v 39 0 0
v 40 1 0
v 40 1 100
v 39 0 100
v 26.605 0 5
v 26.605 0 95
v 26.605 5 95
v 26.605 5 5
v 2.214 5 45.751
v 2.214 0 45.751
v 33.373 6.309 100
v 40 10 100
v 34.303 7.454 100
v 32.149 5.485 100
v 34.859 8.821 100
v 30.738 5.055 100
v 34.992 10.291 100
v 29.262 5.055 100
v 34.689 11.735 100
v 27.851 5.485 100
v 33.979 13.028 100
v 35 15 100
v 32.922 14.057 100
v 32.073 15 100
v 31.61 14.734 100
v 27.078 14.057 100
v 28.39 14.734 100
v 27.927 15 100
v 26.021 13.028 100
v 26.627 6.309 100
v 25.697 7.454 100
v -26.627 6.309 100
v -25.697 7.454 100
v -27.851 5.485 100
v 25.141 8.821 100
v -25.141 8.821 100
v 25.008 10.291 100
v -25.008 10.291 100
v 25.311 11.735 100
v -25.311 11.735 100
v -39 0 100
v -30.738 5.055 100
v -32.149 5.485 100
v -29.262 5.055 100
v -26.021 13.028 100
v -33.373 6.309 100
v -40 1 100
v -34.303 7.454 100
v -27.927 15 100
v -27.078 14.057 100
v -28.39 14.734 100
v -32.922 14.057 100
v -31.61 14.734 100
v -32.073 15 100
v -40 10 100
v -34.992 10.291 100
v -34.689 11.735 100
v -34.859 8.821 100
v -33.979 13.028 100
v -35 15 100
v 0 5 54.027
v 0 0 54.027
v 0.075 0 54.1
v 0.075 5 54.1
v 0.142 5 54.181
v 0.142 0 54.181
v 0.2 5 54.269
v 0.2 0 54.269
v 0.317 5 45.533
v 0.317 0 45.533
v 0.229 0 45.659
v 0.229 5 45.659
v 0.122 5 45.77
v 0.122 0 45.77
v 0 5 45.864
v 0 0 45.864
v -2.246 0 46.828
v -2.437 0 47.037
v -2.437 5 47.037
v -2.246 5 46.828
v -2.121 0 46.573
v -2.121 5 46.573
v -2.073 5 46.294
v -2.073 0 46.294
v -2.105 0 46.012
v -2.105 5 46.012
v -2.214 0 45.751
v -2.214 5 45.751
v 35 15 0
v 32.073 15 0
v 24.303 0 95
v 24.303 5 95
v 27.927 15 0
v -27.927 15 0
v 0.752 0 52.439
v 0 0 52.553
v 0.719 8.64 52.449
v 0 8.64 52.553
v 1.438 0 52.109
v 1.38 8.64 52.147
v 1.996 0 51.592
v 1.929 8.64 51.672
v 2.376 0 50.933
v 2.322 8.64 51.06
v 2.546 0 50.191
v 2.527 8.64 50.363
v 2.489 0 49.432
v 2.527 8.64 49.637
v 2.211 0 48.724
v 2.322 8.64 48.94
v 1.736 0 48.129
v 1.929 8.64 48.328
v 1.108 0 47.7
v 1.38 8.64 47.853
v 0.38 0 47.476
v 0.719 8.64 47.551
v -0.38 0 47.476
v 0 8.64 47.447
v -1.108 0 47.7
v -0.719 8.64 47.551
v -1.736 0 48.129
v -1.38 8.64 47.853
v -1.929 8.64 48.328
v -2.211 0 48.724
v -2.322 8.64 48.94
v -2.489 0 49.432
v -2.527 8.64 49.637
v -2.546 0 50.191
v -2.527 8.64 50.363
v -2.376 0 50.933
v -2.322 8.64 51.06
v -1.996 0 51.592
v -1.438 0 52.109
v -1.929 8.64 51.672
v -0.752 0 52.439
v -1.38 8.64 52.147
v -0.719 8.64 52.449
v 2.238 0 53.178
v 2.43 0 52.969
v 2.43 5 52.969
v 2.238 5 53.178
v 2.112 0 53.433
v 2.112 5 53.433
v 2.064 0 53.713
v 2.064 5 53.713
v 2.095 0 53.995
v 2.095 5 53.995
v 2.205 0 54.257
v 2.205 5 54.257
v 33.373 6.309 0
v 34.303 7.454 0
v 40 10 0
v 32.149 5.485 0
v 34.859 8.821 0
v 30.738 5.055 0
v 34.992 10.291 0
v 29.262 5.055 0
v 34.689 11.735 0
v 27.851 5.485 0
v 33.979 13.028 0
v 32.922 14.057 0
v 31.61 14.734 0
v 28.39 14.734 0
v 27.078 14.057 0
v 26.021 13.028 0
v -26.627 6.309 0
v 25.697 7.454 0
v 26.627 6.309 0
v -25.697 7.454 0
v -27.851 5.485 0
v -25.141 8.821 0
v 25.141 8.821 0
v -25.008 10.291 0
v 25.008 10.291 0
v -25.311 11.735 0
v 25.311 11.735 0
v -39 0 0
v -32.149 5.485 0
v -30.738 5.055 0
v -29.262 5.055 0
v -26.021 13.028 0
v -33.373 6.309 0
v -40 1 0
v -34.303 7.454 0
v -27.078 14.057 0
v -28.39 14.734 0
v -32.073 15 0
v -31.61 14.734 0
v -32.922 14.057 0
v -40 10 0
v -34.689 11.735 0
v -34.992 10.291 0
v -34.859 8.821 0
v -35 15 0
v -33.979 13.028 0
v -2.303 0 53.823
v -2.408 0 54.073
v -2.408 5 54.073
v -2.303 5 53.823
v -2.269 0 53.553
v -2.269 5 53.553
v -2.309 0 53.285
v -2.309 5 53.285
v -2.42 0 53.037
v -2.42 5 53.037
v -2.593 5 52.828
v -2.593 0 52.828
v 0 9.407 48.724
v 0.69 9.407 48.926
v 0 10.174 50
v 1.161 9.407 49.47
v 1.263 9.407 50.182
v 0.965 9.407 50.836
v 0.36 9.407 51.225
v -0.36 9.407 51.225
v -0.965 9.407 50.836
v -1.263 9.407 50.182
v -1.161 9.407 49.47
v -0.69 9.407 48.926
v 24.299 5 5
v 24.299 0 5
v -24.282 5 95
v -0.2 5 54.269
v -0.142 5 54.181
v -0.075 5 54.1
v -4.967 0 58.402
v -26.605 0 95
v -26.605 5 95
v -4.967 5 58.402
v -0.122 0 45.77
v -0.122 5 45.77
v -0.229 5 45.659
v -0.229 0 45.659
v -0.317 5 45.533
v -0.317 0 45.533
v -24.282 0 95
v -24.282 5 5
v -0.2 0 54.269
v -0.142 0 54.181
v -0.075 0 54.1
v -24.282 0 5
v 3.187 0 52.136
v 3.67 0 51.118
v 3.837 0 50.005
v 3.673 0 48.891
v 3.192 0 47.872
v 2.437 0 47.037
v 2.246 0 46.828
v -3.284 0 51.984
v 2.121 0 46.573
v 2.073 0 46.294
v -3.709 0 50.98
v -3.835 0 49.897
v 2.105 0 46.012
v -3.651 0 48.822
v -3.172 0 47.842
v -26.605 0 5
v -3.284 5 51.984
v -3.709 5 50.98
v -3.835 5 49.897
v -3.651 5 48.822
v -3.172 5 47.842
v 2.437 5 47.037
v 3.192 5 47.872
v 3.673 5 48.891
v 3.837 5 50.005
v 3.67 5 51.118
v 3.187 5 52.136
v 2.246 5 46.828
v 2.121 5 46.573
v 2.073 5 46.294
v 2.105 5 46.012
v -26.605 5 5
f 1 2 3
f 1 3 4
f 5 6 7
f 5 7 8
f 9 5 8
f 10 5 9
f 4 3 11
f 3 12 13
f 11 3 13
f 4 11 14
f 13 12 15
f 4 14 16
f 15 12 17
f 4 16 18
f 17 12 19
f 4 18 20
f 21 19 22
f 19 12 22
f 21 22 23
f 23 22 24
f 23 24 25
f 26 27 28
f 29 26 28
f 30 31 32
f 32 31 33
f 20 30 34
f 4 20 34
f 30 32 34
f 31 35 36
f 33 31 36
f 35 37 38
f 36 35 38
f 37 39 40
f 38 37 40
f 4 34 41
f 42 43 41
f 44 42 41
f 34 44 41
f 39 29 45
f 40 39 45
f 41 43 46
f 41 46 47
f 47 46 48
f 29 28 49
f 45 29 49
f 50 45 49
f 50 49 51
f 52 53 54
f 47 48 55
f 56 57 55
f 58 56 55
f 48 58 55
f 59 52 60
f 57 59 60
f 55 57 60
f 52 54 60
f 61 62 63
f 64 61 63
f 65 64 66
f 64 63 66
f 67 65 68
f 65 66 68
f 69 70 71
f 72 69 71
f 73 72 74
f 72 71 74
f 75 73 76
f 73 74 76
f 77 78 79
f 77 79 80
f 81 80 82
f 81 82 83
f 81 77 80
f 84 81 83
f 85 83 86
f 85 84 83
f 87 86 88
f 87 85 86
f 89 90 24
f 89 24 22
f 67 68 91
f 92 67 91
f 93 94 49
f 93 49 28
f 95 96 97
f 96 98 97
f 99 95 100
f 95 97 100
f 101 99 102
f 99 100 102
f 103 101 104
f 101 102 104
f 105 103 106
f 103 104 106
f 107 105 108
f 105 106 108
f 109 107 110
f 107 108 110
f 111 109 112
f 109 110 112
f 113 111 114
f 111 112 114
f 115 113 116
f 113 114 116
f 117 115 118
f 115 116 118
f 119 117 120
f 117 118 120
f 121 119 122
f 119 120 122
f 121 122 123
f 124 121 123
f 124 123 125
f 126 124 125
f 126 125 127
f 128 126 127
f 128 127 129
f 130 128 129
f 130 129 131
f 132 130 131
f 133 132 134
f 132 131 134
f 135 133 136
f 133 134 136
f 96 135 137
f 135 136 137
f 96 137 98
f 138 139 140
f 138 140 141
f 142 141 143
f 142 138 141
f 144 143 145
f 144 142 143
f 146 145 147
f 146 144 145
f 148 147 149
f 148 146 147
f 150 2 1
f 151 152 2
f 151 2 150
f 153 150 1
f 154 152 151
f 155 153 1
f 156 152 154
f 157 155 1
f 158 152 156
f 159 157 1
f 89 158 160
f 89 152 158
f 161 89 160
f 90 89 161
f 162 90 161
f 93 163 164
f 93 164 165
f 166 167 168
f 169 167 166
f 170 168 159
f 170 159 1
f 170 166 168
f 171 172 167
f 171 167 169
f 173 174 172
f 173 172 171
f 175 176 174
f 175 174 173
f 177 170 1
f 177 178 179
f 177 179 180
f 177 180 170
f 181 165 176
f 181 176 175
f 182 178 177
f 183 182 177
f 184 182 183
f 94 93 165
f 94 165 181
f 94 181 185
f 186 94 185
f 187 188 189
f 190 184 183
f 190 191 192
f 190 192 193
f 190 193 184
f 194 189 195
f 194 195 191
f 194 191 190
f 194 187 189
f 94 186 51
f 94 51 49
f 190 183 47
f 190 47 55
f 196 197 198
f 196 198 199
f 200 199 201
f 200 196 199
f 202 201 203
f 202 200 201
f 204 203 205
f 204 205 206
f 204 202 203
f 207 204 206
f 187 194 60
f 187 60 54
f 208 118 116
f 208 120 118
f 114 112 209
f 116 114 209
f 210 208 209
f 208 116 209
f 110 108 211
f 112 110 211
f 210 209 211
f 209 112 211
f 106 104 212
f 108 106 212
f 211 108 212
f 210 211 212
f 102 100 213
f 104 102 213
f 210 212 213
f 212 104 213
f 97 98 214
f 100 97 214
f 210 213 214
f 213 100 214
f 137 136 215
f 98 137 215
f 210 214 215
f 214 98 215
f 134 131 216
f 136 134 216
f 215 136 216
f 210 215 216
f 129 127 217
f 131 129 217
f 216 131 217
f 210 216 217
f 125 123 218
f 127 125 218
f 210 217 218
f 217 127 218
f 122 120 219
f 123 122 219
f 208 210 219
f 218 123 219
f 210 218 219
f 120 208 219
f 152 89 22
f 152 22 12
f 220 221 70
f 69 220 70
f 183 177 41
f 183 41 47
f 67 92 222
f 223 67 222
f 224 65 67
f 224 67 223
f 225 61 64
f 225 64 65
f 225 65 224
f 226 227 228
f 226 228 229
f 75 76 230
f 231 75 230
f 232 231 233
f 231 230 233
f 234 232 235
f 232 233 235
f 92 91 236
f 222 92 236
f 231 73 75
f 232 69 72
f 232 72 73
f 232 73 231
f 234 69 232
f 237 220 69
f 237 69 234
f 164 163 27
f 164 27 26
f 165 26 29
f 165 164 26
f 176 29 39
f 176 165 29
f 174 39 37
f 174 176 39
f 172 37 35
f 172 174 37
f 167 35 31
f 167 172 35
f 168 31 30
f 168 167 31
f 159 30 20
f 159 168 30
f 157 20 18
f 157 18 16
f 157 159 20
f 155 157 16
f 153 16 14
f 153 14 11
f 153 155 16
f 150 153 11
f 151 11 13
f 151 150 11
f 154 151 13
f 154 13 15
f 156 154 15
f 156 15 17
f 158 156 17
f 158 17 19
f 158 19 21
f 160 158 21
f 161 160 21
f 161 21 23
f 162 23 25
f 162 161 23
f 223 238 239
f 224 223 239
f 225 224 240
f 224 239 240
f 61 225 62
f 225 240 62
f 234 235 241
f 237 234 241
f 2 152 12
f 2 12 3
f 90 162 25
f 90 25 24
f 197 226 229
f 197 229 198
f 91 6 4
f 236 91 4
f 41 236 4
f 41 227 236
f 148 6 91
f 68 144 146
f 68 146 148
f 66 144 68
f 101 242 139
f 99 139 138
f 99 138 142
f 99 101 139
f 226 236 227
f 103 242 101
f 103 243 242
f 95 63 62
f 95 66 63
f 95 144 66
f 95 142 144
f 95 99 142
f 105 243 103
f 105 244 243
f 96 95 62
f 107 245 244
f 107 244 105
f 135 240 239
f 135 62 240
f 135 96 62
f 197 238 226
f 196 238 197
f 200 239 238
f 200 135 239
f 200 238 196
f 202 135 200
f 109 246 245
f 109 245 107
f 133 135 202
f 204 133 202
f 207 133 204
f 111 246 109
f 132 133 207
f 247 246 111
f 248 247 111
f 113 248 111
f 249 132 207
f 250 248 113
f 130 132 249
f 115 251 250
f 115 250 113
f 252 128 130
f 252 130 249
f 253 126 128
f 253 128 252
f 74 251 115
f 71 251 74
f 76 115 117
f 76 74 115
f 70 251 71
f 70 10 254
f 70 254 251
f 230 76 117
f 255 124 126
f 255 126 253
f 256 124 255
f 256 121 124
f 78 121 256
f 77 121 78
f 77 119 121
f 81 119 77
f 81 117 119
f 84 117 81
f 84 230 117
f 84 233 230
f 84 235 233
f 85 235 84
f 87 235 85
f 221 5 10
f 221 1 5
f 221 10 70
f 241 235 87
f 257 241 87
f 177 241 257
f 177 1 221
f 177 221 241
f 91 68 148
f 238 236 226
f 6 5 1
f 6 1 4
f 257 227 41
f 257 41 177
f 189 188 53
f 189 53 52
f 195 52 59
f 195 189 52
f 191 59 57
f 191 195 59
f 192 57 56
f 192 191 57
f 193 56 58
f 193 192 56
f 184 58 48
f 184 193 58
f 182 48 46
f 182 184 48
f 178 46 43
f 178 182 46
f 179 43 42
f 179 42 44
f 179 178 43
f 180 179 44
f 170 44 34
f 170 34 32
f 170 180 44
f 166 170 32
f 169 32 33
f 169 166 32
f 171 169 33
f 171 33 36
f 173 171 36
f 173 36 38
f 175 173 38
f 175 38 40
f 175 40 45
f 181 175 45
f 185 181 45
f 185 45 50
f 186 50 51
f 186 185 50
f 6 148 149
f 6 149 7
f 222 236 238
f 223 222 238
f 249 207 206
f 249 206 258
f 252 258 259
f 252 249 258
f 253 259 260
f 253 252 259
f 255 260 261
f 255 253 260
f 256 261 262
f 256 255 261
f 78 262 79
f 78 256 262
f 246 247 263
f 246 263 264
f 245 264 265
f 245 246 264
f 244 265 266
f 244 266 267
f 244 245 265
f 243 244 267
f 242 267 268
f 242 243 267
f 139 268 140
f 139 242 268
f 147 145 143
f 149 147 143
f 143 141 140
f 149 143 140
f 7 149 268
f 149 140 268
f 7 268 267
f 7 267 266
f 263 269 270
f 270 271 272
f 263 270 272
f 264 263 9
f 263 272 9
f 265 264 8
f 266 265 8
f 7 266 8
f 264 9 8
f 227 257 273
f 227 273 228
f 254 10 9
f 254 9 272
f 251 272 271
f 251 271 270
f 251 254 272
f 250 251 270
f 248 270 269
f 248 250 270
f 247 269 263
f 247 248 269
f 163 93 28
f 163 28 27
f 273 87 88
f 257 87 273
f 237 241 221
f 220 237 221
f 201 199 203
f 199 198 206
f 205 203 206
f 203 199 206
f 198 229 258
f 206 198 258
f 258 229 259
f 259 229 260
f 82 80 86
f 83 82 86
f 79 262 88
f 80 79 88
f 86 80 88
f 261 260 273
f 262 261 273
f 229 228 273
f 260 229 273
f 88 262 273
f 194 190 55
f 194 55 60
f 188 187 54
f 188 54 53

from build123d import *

# Parameters (mm, degrees)
DODANIE_WYCI_GNI_CIE1_DEPTH    = 100
WYTNIJ_WYCI_GNI_CIE1_DEPTH     = 5
OTW_R_GWINTOWANY_1_4_201_D     = 5.1054
OTW_R_GWINTOWANY_1_4_201_DEPTH = 8.64
OTW_R_GWINTOWANY_1_4_201_TIP   = 1.533816902


with BuildPart() as part:
    # Szkic1 → Dodanie-wyciągnięcie1 (new body)
    with BuildSketch(Plane.XY):
        with BuildLine():
            Line((27.92734735, 15), (28.389677427, 14.733588619))
            ThreePointArc((28.389677427, 14.733588619), (30, 5), (31.610322573, 14.733588619))
            Line((31.610322573, 14.733588619), (32.07265265, 15))
            Line((32.07265265, 15), (35, 15))
            Line((35, 15), (40, 10))
            Line((40, 10), (40, 1))
            Line((40, 1), (39, 0))
            Line((39, 0), (-39, 0))
            Line((-39, 0), (-40, 1))
            Line((-40, 1), (-40, 10))
            Line((-40, 10), (-35, 15))
            Line((-35, 15), (-32.07265265, 15))
            Line((-32.07265265, 15), (-31.610322573, 14.733588619))
            ThreePointArc((-31.610322573, 14.733588619), (-30, 5), (-28.389677427, 14.733588619))
            Line((-28.389677427, 14.733588619), (-27.92734735, 15))
            Line((-27.92734735, 15), (27.92734735, 15))
        make_face()
    extrude(amount=DODANIE_WYCI_GNI_CIE1_DEPTH)

    # Szkic2 → Wytnij-wyciągnięcie1 (cut)
    with BuildSketch(Plane(origin=(0, 0, 0), x_dir=(-1, 0, 0), z_dir=(0, -1, 0))):
        with BuildLine():
            Line((-24.299393508, -5), (-0.317489033, -45.533191657))
            ThreePointArc((-0.317489033, -45.533191657), (-0.177941432, -45.716925413), (0, -45.863787501))
            ThreePointArc((0, -45.863787501), (0.177941432, -45.716925413), (0.317489033, -45.533191657))
            Line((0.317489033, -45.533191657), (24.281729572, -5))
            Line((24.281729572, -5), (-24.299393508, -5))
        make_face()
        with BuildLine():
            Line((2.408314264, -54.073430305), (26.605129776, -95))
            Line((26.605129776, -95), (26.605129776, -5))
            Line((26.605129776, -5), (2.214243, -45.750943625))
            ThreePointArc((2.214243, -45.750943625), (2.086974186, -46.435257956), (2.437074489, -47.036850202))
            ThreePointArc((2.437074489, -47.036850202), (3.835217741, -49.896589795), (2.593210084, -52.827516622))
            ThreePointArc((2.593210084, -52.827516622), (2.279954566, -53.41770522), (2.408314264, -54.073430305))
        make_face()
        with BuildLine():
            Line((-24.302635093, -95), (24.281729572, -95))
            Line((24.281729572, -95), (0.200251555, -54.268512505))
            ThreePointArc((0.200251555, -54.268512505), (0.109677176, -54.139680814), (0, -54.02666648))
            ThreePointArc((0, -54.02666648), (-0.109677176, -54.139680814), (-0.200251555, -54.268512505))
            Line((-0.200251555, -54.268512505), (-24.302635093, -95))
        make_face()
        with BuildLine():
            ThreePointArc((-2.437074489, -47.036850202), (-2.086974186, -46.435257956), (-2.214243, -45.750943625))
            Line((-2.214243, -45.750943625), (-26.605129776, -5))
            Line((-26.605129776, -5), (-26.605129776, -95))
            Line((-26.605129776, -95), (-2.205174034, -54.256813529))
            ThreePointArc((-2.205174034, -54.256813529), (-2.077967373, -53.571197168), (-2.429779642, -52.9691345))
            ThreePointArc((-2.429779642, -52.9691345), (-3.836608728, -50.004717824), (-2.437074489, -47.036850202))
        make_face()
    extrude(amount=-WYTNIJ_WYCI_GNI_CIE1_DEPTH, mode=Mode.SUBTRACT)

    # Otwór gwintowany 1/4-201
    with Locations(Plane(origin=(0, 0, 50), x_dir=(0, 0, -1), z_dir=(0, -1, 0))):
        with Locations((0, 0)):
            Hole(OTW_R_GWINTOWANY_1_4_201_D / 2, depth=OTW_R_GWINTOWANY_1_4_201_DEPTH)
            with Locations((0, 0, -(OTW_R_GWINTOWANY_1_4_201_DEPTH + OTW_R_GWINTOWANY_1_4_201_TIP / 2))):  # 118° drill point
                Cone(0, OTW_R_GWINTOWANY_1_4_201_D / 2, OTW_R_GWINTOWANY_1_4_201_TIP, mode=Mode.SUBTRACT)


solid = part.part
